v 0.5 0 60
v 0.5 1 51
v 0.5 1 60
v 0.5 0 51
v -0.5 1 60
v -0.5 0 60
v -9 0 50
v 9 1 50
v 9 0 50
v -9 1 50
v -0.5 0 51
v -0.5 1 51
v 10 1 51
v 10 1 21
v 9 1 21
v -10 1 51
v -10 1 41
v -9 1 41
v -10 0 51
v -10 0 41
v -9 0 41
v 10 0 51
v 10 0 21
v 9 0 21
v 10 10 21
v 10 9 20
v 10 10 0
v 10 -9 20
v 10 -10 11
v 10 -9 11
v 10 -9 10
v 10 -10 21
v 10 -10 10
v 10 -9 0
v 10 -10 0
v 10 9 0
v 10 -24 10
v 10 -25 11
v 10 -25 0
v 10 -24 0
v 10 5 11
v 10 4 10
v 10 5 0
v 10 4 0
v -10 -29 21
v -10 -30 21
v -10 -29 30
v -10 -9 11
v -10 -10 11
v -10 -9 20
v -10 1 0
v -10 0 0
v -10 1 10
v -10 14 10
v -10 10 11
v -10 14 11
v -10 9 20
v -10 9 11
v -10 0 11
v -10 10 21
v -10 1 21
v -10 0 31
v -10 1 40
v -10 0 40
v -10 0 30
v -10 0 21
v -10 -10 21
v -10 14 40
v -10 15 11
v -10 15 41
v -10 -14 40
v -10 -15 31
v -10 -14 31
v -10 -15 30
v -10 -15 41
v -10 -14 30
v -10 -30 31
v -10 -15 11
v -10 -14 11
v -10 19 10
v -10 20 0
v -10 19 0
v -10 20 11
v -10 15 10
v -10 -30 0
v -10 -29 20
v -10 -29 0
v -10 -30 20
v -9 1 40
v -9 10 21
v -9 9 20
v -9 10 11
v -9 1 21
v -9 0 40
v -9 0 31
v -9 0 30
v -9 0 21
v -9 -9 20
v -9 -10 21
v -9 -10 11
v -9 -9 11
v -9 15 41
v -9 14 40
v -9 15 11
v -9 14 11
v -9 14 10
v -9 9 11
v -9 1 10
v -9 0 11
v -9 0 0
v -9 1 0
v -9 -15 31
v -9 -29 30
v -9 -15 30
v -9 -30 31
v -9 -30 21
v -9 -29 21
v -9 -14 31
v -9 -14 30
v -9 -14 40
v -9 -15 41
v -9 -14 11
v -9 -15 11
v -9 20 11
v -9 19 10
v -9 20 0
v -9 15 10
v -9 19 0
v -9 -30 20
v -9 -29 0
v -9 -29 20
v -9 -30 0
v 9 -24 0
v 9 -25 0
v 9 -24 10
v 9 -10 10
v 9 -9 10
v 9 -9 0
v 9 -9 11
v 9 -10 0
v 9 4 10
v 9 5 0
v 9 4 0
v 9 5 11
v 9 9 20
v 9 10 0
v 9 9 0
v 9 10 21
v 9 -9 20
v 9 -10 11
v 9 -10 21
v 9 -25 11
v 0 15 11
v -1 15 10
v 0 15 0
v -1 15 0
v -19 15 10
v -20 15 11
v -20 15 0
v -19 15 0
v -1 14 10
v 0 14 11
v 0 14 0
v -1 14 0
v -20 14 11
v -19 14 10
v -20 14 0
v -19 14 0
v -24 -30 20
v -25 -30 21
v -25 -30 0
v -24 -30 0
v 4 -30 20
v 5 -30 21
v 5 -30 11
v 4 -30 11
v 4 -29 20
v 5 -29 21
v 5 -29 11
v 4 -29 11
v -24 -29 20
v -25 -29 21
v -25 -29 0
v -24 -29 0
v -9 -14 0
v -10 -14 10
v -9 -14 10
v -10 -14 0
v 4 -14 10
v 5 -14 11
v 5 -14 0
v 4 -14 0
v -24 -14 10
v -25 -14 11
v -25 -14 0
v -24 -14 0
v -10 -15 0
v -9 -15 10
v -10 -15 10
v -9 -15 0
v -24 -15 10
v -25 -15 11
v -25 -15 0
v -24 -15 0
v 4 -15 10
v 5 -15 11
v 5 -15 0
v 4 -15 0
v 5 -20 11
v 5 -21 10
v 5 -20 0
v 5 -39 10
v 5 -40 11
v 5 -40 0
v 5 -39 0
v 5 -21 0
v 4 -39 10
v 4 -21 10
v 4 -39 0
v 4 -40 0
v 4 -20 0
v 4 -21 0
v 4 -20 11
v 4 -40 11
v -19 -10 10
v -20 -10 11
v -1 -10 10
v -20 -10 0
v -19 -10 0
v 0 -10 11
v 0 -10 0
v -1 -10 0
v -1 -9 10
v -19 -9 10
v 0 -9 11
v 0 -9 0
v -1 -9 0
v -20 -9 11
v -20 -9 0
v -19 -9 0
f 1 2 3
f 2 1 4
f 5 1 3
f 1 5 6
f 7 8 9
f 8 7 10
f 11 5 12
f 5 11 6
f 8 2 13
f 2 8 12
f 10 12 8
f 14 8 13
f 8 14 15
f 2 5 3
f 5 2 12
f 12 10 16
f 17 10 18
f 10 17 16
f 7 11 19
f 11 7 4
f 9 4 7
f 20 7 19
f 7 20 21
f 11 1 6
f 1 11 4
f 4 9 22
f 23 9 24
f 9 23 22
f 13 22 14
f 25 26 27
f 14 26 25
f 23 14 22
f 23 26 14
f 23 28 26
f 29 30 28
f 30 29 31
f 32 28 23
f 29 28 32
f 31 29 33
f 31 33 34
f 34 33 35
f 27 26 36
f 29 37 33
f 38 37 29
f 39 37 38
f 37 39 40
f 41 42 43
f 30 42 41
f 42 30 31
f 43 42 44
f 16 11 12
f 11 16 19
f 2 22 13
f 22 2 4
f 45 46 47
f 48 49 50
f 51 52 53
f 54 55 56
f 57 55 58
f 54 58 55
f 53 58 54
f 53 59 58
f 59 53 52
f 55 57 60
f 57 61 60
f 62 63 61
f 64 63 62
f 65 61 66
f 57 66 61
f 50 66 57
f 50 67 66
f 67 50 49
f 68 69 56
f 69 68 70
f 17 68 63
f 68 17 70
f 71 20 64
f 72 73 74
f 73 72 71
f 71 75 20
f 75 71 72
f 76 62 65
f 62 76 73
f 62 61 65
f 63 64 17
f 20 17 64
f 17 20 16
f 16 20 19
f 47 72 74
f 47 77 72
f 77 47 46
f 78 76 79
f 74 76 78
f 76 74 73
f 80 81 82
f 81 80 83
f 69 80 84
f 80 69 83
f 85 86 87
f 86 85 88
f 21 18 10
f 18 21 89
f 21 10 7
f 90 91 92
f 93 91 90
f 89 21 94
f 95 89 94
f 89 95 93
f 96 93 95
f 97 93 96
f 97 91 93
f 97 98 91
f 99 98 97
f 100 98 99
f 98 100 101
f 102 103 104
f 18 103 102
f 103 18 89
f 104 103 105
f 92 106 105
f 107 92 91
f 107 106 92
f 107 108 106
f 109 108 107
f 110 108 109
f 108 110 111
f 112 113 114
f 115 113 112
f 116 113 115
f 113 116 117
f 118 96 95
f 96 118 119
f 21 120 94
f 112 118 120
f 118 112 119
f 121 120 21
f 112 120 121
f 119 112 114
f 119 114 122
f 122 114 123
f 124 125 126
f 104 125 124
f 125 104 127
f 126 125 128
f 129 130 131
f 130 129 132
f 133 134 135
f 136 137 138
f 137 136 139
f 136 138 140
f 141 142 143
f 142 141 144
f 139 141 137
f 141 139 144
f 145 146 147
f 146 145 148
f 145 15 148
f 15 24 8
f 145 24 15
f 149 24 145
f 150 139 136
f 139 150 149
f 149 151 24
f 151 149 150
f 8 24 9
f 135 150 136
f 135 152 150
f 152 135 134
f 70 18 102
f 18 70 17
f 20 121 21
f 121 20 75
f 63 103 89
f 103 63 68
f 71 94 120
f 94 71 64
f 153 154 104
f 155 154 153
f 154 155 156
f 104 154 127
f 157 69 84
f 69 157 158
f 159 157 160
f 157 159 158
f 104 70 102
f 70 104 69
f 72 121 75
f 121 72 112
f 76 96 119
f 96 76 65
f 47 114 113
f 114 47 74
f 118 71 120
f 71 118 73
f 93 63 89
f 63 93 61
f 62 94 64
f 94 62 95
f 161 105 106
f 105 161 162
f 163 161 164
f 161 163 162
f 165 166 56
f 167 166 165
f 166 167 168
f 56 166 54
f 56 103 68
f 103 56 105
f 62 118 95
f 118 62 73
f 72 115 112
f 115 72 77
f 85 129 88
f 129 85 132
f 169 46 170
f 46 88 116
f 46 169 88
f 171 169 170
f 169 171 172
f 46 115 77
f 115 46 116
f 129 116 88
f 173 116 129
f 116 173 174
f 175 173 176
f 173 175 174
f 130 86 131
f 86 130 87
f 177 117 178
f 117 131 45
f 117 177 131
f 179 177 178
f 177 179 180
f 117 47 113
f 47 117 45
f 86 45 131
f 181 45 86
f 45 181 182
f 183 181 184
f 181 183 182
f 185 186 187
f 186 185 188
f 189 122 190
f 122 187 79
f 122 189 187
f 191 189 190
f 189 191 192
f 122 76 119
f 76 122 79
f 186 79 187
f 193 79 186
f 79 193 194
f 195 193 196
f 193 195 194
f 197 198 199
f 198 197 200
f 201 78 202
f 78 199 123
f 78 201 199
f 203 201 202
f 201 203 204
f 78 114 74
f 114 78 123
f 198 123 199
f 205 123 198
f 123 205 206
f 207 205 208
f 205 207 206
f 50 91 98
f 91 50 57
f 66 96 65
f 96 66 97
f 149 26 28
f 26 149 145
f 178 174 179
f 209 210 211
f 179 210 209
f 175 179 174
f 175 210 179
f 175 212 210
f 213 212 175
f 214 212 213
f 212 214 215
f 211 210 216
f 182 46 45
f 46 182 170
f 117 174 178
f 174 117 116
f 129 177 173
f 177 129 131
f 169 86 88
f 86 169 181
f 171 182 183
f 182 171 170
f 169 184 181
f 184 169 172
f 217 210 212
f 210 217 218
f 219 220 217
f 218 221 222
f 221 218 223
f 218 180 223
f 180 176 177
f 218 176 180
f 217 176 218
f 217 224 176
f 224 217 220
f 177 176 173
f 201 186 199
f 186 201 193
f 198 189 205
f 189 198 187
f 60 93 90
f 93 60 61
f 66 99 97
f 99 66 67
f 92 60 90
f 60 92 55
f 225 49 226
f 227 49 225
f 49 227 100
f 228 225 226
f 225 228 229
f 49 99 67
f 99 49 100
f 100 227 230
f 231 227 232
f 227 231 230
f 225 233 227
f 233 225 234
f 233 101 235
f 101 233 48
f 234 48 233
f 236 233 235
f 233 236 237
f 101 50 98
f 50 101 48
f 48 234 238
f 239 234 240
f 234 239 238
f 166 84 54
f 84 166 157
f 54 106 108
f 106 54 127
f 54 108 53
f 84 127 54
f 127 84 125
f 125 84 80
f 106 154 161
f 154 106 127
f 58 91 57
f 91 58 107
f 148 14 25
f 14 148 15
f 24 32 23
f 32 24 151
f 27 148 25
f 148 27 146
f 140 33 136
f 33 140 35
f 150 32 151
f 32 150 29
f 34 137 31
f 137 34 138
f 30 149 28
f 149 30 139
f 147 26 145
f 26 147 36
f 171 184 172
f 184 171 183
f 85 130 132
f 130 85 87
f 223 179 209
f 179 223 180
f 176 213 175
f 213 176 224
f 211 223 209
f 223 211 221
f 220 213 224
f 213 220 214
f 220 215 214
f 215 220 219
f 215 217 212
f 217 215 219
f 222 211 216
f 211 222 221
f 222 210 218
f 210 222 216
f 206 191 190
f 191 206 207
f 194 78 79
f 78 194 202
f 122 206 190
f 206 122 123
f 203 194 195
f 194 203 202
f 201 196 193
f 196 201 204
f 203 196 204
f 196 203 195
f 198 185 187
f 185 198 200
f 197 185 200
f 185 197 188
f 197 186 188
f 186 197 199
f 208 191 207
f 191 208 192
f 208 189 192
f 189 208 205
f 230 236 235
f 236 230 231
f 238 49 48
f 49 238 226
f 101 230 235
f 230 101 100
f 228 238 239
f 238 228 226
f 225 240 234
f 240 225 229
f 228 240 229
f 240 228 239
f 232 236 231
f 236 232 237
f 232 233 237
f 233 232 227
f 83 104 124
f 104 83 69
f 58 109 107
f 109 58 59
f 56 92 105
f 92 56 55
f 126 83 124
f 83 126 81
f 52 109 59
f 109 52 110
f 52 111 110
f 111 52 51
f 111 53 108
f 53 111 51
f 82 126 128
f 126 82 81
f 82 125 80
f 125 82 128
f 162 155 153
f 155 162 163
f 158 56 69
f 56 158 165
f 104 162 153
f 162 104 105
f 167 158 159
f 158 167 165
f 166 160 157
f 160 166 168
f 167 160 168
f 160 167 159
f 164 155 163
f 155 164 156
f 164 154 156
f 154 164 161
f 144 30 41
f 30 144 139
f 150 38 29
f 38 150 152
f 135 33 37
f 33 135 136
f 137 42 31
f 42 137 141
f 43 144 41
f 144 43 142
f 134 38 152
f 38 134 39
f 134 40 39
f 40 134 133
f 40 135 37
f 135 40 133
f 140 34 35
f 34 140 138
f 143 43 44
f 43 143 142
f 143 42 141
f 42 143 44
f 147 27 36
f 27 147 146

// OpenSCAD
translate([-.5, 0, 50]) {
    cube([1, 1, 10]);
    }
translate([-10, 0, 50]) {
    cube([20, 1, 1]);
    }
translate([-10, 0, 40]) {
    cube([1, 1, 10]);
    }
translate([9, 0, 40]) {
    cube([1, 1, 10]);
    }
translate([-10, -15, 40]) {
    cube([1, 30, 1]);
    }
translate([-10, -15, 30]) {
    cube([1, 1, 10]);
    }
translate([-10, 0, 30]) {
    cube([1, 1, 10]);
    }
translate([-10, 14, 30]) {
    cube([1, 1, 10]);
    }
translate([9, 0, 30]) {
    cube([1, 1, 10]);
    }
translate([-10, -30, 30]) {
    cube([1, 30, 1]);
    }
translate([-10, -30, 20]) {
    cube([1, 1, 10]);
    }
translate([-10, -15, 20]) {
    cube([1, 1, 10]);
    }
translate([-10, 0, 20]) {
    cube([1, 1, 10]);
    }
translate([-10, 14, 20]) {
    cube([1, 1, 10]);
    }
translate([9, 0, 20]) {
    cube([1, 1, 10]);
    }
translate([-25, -30, 20]) {
    cube([30, 1, 1]);
    }
translate([-25, -30, 10]) {
    cube([1, 1, 10]);
    }
translate([-10, -30, 10]) {
    cube([1, 1, 10]);
    }
translate([4, -30, 10]) {
    cube([1, 1, 10]);
    }
translate([-10, -15, 10]) {
    cube([1, 1, 10]);
    }
translate([-10, -10, 20]) {
    cube([1, 20, 1]);
    }
translate([-10, -10, 10]) {
    cube([1, 1, 10]);
    }
translate([-10, 9, 10]) {
    cube([1, 1, 10]);
    }
translate([-10, 14, 10]) {
    cube([1, 1, 10]);
    }
translate([9, -10, 20]) {
    cube([1, 20, 1]);
    }
translate([9, -10, 10]) {
    cube([1, 1, 10]);
    }
translate([9, 9, 10]) {
    cube([1, 1, 10]);
    }
translate([-25, -30, 0]) {
    cube([1, 1, 10]);
    }
translate([-10, -30, 0]) {
    cube([1, 1, 10]);
    }
translate([4, -40, 10]) {
    cube([1, 20, 1]);
    }
translate([4, -40, 0]) {
    cube([1, 1, 10]);
    }
translate([4, -21, 0]) {
    cube([1, 1, 10]);
    }
translate([-25, -15, 10]) {
    cube([30, 1, 1]);
    }
translate([-25, -15, 0]) {
    cube([1, 1, 10]);
    }
translate([-10, -15, 0]) {
    cube([1, 1, 10]);
    }
translate([4, -15, 0]) {
    cube([1, 1, 10]);
    }
translate([-20, -10, 10]) {
    cube([20, 1, 1]);
    }
translate([-20, -10, 0]) {
    cube([1, 1, 10]);
    }
translate([-1, -10, 0]) {
    cube([1, 1, 10]);
    }
translate([-10, 0, 10]) {
    cube([1, 20, 1]);
    }
translate([-10, 0, 0]) {
    cube([1, 1, 10]);
    }
translate([-10, 19, 0]) {
    cube([1, 1, 10]);
    }
translate([-20, 14, 10]) {
    cube([20, 1, 1]);
    }
translate([-20, 14, 0]) {
    cube([1, 1, 10]);
    }
translate([-1, 14, 0]) {
    cube([1, 1, 10]);
    }
translate([9, -25, 10]) {
    cube([1, 30, 1]);
    }
translate([9, -25, 0]) {
    cube([1, 1, 10]);
    }
translate([9, -10, 0]) {
    cube([1, 1, 10]);
    }
translate([9, 4, 0]) {
    cube([1, 1, 10]);
    }
translate([9, 9, 0]) {
    cube([1, 1, 10]);
    }
